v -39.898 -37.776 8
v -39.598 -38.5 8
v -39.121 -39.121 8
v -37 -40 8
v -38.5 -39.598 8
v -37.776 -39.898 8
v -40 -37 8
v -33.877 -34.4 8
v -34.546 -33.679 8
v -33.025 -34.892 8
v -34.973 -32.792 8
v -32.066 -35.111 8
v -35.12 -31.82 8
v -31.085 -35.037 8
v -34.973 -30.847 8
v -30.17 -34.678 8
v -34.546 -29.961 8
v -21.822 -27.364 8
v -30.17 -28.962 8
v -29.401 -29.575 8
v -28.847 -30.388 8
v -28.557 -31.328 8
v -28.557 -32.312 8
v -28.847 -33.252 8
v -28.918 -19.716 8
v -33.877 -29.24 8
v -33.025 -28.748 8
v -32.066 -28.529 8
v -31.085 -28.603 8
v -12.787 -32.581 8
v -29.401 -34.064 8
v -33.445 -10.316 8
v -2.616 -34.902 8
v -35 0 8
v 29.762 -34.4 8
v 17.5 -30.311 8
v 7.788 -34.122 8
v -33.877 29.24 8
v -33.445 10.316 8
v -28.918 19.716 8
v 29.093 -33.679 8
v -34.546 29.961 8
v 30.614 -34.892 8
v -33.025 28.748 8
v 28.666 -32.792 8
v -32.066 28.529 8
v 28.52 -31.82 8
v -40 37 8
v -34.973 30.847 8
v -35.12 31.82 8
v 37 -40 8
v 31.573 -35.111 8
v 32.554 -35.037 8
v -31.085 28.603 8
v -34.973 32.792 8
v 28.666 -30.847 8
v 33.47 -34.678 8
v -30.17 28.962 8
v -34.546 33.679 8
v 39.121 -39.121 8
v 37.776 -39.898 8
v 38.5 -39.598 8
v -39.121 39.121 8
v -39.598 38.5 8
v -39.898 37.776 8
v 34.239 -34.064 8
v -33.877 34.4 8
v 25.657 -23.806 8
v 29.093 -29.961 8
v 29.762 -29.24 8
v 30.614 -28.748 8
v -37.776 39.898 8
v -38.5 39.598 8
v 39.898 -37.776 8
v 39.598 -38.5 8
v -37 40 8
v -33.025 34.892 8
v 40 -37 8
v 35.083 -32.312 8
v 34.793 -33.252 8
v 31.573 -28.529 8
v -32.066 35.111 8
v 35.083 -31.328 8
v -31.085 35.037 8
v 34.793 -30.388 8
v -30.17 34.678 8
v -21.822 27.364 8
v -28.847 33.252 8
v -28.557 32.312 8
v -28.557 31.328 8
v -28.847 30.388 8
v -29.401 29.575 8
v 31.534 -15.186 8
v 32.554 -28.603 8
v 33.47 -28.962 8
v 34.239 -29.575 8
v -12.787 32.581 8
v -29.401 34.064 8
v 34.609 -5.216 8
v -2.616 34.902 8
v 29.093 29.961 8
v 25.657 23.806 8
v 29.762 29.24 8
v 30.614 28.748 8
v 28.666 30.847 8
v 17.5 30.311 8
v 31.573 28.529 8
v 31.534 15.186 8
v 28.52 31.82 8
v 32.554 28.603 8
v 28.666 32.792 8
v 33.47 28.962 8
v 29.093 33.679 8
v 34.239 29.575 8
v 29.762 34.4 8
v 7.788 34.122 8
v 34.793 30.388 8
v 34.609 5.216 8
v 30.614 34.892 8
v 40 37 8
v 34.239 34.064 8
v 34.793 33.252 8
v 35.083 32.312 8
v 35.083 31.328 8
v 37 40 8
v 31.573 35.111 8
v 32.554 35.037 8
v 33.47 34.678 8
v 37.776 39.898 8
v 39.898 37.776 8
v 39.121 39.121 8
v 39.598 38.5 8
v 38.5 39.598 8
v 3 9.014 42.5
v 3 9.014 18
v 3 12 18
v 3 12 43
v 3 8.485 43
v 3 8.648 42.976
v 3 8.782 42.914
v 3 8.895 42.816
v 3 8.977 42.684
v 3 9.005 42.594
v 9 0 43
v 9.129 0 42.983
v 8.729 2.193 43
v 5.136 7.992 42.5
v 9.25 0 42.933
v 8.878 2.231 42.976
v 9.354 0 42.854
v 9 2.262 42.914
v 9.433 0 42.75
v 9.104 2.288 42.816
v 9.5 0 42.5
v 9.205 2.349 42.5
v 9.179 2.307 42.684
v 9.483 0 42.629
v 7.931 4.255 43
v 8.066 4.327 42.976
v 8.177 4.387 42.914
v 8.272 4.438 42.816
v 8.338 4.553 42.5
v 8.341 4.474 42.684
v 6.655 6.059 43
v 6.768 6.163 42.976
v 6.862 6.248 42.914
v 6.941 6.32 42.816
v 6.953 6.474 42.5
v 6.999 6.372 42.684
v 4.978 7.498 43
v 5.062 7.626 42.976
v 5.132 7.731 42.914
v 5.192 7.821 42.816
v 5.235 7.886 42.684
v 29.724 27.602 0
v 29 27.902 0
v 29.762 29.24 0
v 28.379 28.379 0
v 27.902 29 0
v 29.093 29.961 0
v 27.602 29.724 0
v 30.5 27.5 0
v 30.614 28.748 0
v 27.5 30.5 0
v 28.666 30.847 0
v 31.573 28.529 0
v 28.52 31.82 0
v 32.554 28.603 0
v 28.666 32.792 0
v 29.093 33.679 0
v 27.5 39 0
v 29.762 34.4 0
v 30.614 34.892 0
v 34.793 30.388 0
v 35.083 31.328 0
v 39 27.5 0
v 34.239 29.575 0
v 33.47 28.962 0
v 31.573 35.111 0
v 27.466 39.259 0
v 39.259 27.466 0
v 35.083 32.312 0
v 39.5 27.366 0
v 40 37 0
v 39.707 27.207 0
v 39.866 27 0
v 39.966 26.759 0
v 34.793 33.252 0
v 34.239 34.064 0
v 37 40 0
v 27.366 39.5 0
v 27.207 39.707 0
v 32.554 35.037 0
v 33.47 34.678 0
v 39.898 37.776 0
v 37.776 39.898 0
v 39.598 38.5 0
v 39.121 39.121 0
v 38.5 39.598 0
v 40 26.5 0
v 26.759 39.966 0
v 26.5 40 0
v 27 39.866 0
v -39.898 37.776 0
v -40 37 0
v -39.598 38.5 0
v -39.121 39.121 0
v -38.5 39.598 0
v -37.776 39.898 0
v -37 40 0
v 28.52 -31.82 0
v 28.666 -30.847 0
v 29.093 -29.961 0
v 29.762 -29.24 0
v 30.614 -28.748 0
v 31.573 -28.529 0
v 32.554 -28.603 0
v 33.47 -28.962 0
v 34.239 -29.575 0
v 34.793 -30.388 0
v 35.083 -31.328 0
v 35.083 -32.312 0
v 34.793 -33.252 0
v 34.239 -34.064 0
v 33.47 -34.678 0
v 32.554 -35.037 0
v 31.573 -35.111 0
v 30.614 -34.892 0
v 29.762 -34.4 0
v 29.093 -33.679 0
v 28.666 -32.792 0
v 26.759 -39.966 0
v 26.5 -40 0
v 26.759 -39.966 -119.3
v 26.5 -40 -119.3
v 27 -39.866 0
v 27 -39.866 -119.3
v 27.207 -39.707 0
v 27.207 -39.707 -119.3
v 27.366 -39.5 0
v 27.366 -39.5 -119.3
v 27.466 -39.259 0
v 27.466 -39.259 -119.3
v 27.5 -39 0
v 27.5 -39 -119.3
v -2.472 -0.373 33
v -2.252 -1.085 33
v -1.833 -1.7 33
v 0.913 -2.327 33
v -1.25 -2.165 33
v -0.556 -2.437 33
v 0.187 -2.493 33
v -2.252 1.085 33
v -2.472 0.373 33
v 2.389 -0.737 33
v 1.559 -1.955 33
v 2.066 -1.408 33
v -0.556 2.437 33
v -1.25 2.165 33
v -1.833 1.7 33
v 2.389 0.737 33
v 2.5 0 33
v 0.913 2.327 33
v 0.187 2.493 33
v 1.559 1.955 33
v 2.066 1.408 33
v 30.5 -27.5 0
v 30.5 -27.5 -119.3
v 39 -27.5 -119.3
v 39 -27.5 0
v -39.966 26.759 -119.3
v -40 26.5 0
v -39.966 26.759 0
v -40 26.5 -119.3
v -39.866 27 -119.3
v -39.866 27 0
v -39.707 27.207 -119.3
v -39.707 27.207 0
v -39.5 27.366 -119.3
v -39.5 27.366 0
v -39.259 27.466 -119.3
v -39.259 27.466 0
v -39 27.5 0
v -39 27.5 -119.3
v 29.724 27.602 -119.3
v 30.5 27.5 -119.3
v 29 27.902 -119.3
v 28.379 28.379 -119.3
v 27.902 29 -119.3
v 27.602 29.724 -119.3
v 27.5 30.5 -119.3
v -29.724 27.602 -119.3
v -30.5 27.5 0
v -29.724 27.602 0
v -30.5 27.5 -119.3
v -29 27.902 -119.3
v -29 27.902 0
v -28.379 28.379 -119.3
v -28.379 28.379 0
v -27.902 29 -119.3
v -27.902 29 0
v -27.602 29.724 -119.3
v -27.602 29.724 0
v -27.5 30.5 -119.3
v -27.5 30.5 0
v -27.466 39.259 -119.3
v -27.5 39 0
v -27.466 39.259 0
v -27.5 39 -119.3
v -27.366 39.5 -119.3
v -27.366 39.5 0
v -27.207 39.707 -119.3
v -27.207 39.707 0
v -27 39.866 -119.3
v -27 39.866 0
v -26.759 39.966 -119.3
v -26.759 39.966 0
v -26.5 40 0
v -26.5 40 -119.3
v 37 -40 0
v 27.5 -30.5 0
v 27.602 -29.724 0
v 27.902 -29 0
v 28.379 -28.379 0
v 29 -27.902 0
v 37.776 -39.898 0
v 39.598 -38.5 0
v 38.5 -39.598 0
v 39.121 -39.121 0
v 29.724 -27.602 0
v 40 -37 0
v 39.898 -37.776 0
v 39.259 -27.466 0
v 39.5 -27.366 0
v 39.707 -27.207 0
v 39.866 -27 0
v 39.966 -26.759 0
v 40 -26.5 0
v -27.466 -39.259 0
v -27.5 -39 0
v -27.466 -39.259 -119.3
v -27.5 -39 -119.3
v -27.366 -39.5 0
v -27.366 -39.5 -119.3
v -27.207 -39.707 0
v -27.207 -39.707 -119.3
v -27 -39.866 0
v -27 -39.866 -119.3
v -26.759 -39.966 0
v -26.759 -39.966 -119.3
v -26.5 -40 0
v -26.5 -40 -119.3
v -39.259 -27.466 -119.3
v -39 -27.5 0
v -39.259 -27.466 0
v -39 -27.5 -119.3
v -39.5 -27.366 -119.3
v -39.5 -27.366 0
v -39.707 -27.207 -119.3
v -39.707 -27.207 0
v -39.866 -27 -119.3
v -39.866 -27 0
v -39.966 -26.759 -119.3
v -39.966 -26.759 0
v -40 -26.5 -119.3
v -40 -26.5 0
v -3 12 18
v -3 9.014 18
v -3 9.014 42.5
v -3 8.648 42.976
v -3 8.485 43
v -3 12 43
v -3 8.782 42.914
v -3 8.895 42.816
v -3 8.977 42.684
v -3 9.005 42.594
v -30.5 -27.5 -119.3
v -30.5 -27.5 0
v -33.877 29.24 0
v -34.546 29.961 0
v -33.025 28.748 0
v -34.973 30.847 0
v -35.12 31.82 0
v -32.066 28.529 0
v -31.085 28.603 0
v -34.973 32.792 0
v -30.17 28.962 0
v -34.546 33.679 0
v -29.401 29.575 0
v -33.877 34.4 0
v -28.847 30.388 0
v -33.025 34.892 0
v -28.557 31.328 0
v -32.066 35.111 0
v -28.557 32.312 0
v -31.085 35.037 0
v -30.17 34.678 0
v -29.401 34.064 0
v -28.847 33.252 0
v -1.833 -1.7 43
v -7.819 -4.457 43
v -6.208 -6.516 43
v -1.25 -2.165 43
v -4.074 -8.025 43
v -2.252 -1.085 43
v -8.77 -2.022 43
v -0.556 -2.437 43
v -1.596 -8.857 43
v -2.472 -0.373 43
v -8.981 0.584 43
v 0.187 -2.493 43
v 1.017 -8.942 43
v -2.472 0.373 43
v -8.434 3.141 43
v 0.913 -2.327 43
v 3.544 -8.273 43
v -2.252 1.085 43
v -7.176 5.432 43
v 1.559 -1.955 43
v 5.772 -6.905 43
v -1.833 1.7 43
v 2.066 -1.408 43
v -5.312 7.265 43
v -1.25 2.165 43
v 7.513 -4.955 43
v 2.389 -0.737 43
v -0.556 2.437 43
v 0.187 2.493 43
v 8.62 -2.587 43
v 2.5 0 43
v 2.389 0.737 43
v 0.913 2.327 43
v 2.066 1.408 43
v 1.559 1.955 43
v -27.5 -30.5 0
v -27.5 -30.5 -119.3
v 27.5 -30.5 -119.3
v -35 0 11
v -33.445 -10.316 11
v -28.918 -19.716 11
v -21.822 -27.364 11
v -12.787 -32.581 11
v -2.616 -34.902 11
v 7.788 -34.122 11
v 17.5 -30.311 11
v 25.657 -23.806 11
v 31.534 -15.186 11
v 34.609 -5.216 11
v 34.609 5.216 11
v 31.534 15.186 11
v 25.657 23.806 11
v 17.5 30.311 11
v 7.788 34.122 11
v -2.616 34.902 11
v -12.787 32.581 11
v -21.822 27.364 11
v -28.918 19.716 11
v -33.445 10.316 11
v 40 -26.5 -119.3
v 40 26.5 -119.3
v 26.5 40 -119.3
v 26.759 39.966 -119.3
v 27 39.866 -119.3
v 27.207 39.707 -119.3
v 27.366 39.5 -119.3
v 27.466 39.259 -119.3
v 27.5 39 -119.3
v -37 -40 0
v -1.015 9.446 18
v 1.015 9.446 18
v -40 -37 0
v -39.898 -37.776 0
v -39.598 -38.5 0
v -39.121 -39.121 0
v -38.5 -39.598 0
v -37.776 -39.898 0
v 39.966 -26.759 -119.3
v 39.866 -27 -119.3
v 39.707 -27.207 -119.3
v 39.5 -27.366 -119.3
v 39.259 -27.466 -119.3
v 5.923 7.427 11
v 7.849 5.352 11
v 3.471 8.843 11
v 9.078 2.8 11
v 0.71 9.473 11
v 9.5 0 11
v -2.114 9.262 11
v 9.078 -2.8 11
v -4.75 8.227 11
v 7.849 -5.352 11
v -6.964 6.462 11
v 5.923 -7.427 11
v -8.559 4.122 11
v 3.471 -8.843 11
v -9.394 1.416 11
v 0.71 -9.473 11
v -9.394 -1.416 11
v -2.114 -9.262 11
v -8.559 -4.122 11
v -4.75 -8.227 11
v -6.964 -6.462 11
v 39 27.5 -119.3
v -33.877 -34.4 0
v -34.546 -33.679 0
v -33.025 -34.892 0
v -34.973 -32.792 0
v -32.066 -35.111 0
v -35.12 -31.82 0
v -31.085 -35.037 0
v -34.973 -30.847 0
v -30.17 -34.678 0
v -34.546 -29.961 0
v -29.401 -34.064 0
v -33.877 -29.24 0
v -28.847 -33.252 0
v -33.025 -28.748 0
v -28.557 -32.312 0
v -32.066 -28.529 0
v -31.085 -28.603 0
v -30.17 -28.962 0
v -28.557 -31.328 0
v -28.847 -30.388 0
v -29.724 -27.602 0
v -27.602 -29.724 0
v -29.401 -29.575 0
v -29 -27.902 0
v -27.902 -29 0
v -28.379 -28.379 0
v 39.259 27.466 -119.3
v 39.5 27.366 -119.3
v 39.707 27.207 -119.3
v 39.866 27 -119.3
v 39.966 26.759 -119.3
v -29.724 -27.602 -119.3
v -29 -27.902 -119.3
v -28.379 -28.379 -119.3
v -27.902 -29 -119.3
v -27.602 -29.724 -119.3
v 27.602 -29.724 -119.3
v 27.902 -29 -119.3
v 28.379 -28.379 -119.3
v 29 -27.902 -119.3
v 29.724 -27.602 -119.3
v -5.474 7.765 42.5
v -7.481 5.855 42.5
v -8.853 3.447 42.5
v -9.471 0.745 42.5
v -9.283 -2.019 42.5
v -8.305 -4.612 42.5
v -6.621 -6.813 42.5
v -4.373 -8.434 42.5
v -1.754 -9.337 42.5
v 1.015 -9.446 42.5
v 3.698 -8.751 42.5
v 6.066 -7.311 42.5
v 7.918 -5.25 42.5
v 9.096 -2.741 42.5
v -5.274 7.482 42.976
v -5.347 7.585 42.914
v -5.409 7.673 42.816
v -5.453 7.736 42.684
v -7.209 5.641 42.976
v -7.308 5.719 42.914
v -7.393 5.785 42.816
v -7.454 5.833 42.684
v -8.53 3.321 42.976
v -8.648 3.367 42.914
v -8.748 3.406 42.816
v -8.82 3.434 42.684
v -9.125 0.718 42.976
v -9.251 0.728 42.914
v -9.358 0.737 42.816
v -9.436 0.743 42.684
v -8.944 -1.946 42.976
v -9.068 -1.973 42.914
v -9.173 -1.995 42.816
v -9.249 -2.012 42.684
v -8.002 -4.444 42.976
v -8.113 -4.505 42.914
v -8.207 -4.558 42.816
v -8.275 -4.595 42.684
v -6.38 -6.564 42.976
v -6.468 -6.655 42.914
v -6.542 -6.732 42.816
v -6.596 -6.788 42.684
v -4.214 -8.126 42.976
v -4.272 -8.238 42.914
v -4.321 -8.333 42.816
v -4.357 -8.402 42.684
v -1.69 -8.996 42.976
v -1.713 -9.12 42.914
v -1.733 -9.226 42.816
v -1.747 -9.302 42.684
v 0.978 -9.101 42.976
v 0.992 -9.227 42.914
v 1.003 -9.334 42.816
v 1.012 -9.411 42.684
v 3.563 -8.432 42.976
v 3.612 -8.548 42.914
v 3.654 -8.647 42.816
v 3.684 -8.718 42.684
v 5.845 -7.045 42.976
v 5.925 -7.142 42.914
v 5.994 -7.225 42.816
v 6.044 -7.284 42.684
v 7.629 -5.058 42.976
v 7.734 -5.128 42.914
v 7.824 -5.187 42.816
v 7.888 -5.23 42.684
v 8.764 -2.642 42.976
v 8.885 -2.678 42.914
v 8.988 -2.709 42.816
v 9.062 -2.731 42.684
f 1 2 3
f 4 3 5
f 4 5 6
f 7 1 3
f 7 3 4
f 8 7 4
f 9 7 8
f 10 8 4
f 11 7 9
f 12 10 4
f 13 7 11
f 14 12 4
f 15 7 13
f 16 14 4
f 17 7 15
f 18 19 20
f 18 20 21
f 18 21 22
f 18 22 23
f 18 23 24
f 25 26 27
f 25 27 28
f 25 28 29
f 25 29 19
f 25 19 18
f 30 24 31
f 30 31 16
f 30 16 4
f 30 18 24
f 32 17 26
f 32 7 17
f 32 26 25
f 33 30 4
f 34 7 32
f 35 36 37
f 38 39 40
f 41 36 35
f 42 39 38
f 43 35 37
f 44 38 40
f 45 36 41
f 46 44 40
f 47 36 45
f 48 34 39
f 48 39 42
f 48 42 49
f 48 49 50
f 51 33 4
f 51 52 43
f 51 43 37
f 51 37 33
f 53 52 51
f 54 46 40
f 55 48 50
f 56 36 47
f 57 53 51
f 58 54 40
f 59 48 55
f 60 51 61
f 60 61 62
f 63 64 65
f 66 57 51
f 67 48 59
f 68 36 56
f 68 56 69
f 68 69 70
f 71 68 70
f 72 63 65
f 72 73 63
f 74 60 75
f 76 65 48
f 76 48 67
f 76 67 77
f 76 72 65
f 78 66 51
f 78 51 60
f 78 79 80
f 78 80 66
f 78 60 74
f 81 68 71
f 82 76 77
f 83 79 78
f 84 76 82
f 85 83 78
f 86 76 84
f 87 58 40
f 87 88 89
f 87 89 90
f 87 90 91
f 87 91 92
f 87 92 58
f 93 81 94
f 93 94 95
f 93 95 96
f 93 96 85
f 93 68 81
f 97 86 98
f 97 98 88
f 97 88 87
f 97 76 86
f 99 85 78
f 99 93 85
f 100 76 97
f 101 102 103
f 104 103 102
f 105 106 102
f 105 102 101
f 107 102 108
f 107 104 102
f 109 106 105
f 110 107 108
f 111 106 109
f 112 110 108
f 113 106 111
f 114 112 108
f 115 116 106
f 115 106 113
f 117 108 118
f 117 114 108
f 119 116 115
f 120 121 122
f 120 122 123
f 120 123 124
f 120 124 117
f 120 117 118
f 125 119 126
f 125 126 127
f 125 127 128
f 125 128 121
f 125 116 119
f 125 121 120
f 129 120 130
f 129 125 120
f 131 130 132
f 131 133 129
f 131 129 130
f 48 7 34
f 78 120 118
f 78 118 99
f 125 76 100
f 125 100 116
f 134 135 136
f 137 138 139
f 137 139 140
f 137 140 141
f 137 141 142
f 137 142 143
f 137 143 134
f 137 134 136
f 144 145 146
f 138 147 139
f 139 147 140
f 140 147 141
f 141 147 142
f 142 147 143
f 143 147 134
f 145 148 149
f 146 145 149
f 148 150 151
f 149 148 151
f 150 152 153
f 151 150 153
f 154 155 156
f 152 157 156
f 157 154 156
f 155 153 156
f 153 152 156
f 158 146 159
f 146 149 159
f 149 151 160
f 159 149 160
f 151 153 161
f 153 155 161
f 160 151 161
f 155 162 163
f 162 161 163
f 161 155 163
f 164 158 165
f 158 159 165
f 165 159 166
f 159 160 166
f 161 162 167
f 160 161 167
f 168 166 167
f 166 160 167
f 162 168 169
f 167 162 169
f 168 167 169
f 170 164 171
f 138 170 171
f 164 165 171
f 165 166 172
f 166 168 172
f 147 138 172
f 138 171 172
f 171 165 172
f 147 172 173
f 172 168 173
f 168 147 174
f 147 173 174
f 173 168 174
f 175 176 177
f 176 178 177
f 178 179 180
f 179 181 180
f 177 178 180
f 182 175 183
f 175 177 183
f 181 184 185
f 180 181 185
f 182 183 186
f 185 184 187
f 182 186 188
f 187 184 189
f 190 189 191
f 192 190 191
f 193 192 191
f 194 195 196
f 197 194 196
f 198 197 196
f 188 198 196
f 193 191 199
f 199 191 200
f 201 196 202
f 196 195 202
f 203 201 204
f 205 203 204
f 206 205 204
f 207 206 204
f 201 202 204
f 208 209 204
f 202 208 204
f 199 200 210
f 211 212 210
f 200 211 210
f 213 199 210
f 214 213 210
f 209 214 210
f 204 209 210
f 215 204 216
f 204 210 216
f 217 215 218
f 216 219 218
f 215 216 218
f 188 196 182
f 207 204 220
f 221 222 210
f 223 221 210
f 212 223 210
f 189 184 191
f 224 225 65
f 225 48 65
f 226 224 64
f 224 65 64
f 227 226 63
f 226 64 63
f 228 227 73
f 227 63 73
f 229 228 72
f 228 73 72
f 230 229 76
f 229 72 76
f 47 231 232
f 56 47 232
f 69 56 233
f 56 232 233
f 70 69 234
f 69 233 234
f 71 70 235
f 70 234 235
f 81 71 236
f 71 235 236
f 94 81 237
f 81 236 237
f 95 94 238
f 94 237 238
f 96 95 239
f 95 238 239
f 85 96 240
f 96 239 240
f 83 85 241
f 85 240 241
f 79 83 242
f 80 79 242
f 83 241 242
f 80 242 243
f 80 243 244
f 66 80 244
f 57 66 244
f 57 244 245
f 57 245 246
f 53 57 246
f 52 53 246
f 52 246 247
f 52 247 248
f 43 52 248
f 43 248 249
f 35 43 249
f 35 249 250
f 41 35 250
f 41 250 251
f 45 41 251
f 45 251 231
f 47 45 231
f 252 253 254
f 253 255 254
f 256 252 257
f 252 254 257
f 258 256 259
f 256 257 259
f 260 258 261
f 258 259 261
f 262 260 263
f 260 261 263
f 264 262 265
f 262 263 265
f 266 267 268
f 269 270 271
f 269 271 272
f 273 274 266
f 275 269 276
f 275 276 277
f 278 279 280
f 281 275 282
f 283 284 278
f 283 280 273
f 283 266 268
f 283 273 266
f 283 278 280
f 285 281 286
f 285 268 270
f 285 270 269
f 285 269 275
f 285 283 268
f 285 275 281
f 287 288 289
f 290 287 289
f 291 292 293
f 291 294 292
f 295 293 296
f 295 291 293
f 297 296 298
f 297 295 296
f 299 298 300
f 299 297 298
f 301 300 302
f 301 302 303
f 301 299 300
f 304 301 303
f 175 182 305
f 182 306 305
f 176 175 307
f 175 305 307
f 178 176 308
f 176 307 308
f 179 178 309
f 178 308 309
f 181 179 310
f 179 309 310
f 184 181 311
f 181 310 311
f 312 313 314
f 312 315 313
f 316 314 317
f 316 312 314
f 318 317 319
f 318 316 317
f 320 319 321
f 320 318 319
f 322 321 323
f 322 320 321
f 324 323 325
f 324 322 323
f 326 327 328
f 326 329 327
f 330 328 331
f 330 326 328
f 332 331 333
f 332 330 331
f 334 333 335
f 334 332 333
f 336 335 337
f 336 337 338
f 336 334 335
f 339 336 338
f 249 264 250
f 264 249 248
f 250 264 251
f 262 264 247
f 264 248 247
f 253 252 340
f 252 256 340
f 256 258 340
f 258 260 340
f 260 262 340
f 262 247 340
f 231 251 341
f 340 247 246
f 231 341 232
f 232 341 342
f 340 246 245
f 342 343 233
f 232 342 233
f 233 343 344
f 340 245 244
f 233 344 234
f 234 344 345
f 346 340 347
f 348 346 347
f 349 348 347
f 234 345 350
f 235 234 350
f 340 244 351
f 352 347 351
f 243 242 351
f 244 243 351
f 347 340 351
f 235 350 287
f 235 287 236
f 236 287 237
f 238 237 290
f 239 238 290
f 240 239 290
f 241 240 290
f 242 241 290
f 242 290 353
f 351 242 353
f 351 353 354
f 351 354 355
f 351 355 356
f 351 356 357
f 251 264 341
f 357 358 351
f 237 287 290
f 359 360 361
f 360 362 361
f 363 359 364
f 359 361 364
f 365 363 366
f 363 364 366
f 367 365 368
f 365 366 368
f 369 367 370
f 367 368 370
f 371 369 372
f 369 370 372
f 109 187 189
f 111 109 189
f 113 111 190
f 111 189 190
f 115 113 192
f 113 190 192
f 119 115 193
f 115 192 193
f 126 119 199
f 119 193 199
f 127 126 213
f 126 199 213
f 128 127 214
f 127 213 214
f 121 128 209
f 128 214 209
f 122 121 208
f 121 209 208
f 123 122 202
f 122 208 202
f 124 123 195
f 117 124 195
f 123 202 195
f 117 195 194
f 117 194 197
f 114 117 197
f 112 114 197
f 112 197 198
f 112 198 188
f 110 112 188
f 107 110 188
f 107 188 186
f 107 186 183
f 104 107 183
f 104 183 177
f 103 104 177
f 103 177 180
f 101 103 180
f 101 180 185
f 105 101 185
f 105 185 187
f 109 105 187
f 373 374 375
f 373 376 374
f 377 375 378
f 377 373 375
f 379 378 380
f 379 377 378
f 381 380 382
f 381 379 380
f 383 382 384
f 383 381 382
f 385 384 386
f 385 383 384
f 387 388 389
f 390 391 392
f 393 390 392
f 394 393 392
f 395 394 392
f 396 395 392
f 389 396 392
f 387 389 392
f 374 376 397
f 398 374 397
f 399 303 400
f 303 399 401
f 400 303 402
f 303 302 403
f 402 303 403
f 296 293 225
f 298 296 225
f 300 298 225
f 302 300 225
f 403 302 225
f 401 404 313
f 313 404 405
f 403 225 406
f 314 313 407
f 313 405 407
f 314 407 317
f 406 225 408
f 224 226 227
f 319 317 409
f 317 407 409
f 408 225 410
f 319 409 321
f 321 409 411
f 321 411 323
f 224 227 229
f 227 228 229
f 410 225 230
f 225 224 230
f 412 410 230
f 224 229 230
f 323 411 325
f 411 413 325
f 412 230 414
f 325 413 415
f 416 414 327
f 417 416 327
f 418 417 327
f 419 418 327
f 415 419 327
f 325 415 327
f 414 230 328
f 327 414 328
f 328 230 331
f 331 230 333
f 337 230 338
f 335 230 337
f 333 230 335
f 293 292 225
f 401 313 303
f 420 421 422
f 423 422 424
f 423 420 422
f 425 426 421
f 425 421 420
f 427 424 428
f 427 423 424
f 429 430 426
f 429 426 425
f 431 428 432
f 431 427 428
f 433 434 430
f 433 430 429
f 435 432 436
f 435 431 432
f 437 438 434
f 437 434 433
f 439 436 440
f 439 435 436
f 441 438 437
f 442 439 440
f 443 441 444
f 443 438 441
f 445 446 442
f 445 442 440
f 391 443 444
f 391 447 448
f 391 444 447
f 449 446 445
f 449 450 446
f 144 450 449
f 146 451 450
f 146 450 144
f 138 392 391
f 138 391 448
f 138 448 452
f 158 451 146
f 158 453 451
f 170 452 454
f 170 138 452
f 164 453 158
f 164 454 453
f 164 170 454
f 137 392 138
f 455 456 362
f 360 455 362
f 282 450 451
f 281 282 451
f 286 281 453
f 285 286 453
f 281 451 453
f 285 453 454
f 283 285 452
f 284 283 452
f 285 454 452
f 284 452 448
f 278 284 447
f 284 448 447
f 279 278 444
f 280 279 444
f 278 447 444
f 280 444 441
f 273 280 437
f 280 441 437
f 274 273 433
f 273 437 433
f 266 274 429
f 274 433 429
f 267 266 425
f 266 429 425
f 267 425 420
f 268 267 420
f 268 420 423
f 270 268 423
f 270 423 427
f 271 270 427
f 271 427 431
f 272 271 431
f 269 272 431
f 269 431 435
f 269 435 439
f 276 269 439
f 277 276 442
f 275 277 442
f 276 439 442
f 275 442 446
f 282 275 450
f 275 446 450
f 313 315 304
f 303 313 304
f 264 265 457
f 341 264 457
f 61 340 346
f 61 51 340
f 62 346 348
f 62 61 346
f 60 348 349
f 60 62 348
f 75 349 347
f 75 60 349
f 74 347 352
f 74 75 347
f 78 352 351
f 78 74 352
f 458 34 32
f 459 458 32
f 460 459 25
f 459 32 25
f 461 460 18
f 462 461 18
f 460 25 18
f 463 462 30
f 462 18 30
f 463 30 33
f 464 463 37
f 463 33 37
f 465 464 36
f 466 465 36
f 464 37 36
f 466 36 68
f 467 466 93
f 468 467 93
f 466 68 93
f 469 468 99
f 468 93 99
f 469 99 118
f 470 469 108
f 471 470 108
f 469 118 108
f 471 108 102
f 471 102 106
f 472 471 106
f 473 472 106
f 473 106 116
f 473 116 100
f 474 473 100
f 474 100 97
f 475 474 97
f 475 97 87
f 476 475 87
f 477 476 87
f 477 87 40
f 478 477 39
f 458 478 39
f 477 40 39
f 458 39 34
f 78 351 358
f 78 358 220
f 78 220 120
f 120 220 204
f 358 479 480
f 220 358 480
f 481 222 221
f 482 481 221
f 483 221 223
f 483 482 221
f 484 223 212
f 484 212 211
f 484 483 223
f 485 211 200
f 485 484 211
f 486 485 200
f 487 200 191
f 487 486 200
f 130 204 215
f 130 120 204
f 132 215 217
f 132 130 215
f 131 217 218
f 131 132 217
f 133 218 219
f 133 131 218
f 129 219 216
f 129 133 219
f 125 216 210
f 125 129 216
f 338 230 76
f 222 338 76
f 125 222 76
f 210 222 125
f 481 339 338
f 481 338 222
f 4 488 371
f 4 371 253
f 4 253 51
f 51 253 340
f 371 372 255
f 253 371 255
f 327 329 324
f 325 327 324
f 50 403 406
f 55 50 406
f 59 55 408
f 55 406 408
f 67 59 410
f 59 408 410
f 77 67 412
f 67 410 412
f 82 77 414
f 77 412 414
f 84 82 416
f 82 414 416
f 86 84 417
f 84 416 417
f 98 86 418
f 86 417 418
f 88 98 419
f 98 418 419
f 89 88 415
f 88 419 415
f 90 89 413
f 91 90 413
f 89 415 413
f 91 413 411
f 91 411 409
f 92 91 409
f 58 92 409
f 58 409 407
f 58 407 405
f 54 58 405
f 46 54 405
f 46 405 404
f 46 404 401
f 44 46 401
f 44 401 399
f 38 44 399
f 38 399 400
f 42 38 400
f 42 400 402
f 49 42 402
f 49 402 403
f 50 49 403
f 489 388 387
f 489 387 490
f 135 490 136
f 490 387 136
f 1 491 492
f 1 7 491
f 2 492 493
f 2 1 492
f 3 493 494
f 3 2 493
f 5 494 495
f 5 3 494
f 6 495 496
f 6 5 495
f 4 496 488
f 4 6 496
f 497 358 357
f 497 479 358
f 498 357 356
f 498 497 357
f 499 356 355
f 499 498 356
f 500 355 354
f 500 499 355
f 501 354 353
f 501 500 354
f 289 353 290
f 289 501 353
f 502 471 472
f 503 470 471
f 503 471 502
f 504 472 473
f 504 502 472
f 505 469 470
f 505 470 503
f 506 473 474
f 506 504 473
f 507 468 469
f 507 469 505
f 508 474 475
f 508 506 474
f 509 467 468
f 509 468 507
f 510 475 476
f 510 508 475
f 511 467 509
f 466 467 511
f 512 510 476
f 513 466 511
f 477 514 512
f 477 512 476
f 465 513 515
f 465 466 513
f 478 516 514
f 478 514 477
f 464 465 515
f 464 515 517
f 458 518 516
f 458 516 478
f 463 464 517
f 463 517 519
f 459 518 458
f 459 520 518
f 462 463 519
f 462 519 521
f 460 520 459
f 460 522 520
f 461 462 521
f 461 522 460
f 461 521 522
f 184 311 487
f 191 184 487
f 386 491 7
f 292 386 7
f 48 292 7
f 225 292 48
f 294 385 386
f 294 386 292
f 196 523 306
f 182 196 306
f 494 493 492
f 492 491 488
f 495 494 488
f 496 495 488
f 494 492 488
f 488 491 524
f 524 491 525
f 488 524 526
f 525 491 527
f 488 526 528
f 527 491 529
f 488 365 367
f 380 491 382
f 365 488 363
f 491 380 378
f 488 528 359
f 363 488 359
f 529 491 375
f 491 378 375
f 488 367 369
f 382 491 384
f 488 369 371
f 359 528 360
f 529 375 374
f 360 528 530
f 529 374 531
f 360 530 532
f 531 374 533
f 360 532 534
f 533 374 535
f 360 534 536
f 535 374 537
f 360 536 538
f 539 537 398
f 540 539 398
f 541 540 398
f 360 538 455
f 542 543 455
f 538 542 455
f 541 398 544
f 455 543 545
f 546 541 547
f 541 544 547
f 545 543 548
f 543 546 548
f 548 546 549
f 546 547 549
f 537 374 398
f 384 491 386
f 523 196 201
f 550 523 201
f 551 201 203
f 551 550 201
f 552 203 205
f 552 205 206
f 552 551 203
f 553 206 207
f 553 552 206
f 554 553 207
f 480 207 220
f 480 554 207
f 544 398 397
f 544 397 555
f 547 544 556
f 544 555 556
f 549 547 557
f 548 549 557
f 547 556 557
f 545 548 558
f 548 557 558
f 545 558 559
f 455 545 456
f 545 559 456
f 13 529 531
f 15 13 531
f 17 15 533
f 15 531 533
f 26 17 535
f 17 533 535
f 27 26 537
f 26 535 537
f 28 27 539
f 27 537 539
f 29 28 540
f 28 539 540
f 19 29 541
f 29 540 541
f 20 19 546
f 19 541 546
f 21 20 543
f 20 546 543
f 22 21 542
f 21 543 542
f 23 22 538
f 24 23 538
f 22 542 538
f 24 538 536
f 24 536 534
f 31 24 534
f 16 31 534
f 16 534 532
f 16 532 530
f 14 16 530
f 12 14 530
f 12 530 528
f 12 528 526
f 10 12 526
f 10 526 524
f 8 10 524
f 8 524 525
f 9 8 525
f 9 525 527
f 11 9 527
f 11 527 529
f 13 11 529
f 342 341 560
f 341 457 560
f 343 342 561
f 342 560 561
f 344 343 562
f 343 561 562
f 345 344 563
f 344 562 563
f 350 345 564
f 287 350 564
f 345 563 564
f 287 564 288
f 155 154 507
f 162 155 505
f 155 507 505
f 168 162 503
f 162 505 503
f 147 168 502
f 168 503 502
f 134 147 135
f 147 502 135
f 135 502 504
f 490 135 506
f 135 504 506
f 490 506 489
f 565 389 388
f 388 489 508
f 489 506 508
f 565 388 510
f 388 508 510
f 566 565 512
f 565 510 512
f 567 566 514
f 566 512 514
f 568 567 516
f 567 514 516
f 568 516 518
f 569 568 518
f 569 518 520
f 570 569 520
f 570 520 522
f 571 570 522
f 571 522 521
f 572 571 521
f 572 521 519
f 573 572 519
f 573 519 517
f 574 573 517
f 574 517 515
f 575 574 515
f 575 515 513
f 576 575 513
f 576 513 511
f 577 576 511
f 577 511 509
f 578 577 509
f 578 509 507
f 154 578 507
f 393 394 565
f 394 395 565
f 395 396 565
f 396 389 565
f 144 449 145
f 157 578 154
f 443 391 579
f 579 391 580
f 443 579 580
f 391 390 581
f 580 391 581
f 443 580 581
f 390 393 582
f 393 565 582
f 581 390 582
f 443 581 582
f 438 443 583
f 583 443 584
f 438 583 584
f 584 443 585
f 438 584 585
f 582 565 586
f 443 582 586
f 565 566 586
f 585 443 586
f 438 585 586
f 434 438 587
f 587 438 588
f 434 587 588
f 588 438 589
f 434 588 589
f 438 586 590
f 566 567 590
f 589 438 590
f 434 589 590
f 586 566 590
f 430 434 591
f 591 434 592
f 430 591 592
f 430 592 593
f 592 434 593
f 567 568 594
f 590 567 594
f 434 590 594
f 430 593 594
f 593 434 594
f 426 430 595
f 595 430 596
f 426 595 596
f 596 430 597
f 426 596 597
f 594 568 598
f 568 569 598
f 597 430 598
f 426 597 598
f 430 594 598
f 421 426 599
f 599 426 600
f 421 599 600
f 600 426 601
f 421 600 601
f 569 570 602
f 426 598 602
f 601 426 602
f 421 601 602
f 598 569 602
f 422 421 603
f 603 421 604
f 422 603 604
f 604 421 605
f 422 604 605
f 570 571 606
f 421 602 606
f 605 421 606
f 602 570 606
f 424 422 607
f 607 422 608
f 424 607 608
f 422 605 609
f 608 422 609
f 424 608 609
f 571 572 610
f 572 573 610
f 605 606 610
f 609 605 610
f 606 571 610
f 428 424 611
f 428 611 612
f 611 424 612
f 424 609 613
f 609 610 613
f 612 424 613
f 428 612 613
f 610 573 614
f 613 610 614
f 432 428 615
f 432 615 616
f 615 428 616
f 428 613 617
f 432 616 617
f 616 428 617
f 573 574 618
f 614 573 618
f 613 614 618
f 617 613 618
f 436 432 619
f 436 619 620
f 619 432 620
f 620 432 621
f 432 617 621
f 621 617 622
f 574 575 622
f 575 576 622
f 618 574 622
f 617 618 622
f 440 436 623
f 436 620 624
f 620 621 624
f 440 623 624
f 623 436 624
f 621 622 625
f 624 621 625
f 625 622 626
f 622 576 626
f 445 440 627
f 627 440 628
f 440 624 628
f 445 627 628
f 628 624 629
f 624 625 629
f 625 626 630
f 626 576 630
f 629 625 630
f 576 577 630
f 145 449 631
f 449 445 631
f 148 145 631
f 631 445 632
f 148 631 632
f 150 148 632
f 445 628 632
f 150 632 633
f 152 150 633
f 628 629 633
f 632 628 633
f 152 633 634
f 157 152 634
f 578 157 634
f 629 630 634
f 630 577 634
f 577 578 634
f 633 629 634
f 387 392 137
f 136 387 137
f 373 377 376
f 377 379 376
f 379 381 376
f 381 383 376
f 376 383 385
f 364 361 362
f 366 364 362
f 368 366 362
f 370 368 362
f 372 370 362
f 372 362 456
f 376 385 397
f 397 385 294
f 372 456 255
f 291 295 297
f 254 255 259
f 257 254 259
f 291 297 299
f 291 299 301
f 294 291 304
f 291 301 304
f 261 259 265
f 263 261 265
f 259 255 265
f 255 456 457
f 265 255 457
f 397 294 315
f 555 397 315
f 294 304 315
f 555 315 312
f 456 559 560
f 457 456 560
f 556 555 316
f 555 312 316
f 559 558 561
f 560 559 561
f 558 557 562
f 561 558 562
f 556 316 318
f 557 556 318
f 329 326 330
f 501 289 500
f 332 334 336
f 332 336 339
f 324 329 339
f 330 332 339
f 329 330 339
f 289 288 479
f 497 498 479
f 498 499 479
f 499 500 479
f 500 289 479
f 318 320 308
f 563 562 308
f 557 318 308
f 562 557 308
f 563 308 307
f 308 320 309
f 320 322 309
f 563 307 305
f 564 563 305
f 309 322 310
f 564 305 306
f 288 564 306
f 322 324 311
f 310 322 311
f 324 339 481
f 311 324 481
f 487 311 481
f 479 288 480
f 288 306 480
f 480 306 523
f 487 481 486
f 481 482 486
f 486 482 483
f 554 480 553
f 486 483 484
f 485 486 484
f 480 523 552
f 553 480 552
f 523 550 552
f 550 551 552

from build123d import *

# Parameters (mm, degrees)
SKETCH_1_W              = 80
SKETCH_1_H              = 80
EXTRUDE_1_DEPTH         = 8
FILLET_1_R              = 3
HOLE_WIZARD_6_6_6_6_1_D = 6.6
SKETCH_5_R              = 35
EXTRUDE_2_DEPTH         = 3
SKETCH_6_R              = 9.5
EXTRUDE_3_DEPTH         = 32
EXTRUDE_4_DEPTH         = 119.3
FILLET_2_R              = 3
FILLET_3_R              = 1
SKETCH_8_W              = 6
SKETCH_8_H              = 6
EXTRUDE_5_DEPTH         = 25
FILLET_4_R              = 0.5
SKETCH_9_R              = 2.5
CUT_EXTRUDE_1_DEPTH     = 10


with BuildPart() as part:
    # 草图1 → 凸台-拉伸1 (new body)
    with BuildSketch(Plane.XY):
        Rectangle(SKETCH_1_W, SKETCH_1_H)
    extrude(amount=EXTRUDE_1_DEPTH)

    # 圆角1
    fillet_1_edges = [part.edges().sort_by_distance(p)[0] for p in [
        (40, -40, 4),
        (-40, -40, 4),
        (-40, 40, 4),
        (40, 40, 4),
    ]]
    fillet(fillet_1_edges, radius=FILLET_1_R)

    # Ø6.6 (6.6) 直径孔1 (through all)
    with Locations(Plane.XY.offset(8)):
        with Locations((31.819805153, 31.819805153), (31.819805153, -31.819805153), (-31.819805153, -31.819805153), (-31.819805153, 31.819805153)):
            Hole(HOLE_WIZARD_6_6_6_6_1_D / 2)

    # 草图5 → 凸台-拉伸2 (add)
    with BuildSketch(Plane.XY.offset(8)):
        with Locations(Location((0, 0, 0), (0, 0, 180))):
            Circle(SKETCH_5_R)
    extrude(amount=EXTRUDE_2_DEPTH)

    # 草图6 → 凸台-拉伸3 (add)
    with BuildSketch(Plane.XY.offset(11)):
        Circle(SKETCH_6_R)
    extrude(amount=EXTRUDE_3_DEPTH)

    # 草图7 → 凸台-拉伸4 (add)
    with BuildSketch(Plane(origin=(0, 0, 0), x_dir=(-1, 0, 0), z_dir=(0, 0, -1))):
        Polygon((-27.5, 40), (27.5, 40), (27.5, 27.5), (40, 27.5), (40, -27.5), (27.5, -27.5), (27.5, -40), (-27.5, -40), (-27.5, -27.5), (-40, -27.5), (-40, 27.5), (-27.5, 27.5), align=None)
    extrude(amount=EXTRUDE_4_DEPTH)

    # 圆角2
    fillet_2_edges = [part.edges().sort_by_distance(p)[0] for p in [
        (27.5, -27.5, -59.65),
        (-27.5, -27.5, -59.65),
        (-27.5, 27.5, -59.65),
        (27.5, 27.5, -59.65),
    ]]
    fillet(fillet_2_edges, radius=FILLET_2_R)

    # 圆角3
    fillet_3_edges = [part.edges().sort_by_distance(p)[0] for p in [
        (40, -27.5, -59.65),
        (27.5, -40, -59.65),
        (-27.5, -40, -59.65),
        (-40, -27.5, -59.65),
        (-40, 27.5, -59.65),
        (-27.5, 40, -59.65),
        (27.5, 40, -59.65),
        (40, 27.5, -59.65),
    ]]
    fillet(fillet_3_edges, radius=FILLET_3_R)

    # 草图8 → 凸台-拉伸5 (add)
    with BuildSketch(Plane.XY.offset(43)):
        with Locations((0, 9)):
            Rectangle(SKETCH_8_W, SKETCH_8_H)
    extrude(amount=-EXTRUDE_5_DEPTH)

    # 圆角4
    fillet_4_edges = [part.edges().sort_by_distance(p)[0] for p in [
        (-5.556527693, -7.705517504, 43),
    ]]
    fillet(fillet_4_edges, radius=FILLET_4_R)

    # 草图9 → 切除-拉伸1 (cut)
    with BuildSketch(Plane.XY.offset(43)):
        Circle(SKETCH_9_R)
    extrude(amount=-CUT_EXTRUDE_1_DEPTH, mode=Mode.SUBTRACT)


solid = part.part
